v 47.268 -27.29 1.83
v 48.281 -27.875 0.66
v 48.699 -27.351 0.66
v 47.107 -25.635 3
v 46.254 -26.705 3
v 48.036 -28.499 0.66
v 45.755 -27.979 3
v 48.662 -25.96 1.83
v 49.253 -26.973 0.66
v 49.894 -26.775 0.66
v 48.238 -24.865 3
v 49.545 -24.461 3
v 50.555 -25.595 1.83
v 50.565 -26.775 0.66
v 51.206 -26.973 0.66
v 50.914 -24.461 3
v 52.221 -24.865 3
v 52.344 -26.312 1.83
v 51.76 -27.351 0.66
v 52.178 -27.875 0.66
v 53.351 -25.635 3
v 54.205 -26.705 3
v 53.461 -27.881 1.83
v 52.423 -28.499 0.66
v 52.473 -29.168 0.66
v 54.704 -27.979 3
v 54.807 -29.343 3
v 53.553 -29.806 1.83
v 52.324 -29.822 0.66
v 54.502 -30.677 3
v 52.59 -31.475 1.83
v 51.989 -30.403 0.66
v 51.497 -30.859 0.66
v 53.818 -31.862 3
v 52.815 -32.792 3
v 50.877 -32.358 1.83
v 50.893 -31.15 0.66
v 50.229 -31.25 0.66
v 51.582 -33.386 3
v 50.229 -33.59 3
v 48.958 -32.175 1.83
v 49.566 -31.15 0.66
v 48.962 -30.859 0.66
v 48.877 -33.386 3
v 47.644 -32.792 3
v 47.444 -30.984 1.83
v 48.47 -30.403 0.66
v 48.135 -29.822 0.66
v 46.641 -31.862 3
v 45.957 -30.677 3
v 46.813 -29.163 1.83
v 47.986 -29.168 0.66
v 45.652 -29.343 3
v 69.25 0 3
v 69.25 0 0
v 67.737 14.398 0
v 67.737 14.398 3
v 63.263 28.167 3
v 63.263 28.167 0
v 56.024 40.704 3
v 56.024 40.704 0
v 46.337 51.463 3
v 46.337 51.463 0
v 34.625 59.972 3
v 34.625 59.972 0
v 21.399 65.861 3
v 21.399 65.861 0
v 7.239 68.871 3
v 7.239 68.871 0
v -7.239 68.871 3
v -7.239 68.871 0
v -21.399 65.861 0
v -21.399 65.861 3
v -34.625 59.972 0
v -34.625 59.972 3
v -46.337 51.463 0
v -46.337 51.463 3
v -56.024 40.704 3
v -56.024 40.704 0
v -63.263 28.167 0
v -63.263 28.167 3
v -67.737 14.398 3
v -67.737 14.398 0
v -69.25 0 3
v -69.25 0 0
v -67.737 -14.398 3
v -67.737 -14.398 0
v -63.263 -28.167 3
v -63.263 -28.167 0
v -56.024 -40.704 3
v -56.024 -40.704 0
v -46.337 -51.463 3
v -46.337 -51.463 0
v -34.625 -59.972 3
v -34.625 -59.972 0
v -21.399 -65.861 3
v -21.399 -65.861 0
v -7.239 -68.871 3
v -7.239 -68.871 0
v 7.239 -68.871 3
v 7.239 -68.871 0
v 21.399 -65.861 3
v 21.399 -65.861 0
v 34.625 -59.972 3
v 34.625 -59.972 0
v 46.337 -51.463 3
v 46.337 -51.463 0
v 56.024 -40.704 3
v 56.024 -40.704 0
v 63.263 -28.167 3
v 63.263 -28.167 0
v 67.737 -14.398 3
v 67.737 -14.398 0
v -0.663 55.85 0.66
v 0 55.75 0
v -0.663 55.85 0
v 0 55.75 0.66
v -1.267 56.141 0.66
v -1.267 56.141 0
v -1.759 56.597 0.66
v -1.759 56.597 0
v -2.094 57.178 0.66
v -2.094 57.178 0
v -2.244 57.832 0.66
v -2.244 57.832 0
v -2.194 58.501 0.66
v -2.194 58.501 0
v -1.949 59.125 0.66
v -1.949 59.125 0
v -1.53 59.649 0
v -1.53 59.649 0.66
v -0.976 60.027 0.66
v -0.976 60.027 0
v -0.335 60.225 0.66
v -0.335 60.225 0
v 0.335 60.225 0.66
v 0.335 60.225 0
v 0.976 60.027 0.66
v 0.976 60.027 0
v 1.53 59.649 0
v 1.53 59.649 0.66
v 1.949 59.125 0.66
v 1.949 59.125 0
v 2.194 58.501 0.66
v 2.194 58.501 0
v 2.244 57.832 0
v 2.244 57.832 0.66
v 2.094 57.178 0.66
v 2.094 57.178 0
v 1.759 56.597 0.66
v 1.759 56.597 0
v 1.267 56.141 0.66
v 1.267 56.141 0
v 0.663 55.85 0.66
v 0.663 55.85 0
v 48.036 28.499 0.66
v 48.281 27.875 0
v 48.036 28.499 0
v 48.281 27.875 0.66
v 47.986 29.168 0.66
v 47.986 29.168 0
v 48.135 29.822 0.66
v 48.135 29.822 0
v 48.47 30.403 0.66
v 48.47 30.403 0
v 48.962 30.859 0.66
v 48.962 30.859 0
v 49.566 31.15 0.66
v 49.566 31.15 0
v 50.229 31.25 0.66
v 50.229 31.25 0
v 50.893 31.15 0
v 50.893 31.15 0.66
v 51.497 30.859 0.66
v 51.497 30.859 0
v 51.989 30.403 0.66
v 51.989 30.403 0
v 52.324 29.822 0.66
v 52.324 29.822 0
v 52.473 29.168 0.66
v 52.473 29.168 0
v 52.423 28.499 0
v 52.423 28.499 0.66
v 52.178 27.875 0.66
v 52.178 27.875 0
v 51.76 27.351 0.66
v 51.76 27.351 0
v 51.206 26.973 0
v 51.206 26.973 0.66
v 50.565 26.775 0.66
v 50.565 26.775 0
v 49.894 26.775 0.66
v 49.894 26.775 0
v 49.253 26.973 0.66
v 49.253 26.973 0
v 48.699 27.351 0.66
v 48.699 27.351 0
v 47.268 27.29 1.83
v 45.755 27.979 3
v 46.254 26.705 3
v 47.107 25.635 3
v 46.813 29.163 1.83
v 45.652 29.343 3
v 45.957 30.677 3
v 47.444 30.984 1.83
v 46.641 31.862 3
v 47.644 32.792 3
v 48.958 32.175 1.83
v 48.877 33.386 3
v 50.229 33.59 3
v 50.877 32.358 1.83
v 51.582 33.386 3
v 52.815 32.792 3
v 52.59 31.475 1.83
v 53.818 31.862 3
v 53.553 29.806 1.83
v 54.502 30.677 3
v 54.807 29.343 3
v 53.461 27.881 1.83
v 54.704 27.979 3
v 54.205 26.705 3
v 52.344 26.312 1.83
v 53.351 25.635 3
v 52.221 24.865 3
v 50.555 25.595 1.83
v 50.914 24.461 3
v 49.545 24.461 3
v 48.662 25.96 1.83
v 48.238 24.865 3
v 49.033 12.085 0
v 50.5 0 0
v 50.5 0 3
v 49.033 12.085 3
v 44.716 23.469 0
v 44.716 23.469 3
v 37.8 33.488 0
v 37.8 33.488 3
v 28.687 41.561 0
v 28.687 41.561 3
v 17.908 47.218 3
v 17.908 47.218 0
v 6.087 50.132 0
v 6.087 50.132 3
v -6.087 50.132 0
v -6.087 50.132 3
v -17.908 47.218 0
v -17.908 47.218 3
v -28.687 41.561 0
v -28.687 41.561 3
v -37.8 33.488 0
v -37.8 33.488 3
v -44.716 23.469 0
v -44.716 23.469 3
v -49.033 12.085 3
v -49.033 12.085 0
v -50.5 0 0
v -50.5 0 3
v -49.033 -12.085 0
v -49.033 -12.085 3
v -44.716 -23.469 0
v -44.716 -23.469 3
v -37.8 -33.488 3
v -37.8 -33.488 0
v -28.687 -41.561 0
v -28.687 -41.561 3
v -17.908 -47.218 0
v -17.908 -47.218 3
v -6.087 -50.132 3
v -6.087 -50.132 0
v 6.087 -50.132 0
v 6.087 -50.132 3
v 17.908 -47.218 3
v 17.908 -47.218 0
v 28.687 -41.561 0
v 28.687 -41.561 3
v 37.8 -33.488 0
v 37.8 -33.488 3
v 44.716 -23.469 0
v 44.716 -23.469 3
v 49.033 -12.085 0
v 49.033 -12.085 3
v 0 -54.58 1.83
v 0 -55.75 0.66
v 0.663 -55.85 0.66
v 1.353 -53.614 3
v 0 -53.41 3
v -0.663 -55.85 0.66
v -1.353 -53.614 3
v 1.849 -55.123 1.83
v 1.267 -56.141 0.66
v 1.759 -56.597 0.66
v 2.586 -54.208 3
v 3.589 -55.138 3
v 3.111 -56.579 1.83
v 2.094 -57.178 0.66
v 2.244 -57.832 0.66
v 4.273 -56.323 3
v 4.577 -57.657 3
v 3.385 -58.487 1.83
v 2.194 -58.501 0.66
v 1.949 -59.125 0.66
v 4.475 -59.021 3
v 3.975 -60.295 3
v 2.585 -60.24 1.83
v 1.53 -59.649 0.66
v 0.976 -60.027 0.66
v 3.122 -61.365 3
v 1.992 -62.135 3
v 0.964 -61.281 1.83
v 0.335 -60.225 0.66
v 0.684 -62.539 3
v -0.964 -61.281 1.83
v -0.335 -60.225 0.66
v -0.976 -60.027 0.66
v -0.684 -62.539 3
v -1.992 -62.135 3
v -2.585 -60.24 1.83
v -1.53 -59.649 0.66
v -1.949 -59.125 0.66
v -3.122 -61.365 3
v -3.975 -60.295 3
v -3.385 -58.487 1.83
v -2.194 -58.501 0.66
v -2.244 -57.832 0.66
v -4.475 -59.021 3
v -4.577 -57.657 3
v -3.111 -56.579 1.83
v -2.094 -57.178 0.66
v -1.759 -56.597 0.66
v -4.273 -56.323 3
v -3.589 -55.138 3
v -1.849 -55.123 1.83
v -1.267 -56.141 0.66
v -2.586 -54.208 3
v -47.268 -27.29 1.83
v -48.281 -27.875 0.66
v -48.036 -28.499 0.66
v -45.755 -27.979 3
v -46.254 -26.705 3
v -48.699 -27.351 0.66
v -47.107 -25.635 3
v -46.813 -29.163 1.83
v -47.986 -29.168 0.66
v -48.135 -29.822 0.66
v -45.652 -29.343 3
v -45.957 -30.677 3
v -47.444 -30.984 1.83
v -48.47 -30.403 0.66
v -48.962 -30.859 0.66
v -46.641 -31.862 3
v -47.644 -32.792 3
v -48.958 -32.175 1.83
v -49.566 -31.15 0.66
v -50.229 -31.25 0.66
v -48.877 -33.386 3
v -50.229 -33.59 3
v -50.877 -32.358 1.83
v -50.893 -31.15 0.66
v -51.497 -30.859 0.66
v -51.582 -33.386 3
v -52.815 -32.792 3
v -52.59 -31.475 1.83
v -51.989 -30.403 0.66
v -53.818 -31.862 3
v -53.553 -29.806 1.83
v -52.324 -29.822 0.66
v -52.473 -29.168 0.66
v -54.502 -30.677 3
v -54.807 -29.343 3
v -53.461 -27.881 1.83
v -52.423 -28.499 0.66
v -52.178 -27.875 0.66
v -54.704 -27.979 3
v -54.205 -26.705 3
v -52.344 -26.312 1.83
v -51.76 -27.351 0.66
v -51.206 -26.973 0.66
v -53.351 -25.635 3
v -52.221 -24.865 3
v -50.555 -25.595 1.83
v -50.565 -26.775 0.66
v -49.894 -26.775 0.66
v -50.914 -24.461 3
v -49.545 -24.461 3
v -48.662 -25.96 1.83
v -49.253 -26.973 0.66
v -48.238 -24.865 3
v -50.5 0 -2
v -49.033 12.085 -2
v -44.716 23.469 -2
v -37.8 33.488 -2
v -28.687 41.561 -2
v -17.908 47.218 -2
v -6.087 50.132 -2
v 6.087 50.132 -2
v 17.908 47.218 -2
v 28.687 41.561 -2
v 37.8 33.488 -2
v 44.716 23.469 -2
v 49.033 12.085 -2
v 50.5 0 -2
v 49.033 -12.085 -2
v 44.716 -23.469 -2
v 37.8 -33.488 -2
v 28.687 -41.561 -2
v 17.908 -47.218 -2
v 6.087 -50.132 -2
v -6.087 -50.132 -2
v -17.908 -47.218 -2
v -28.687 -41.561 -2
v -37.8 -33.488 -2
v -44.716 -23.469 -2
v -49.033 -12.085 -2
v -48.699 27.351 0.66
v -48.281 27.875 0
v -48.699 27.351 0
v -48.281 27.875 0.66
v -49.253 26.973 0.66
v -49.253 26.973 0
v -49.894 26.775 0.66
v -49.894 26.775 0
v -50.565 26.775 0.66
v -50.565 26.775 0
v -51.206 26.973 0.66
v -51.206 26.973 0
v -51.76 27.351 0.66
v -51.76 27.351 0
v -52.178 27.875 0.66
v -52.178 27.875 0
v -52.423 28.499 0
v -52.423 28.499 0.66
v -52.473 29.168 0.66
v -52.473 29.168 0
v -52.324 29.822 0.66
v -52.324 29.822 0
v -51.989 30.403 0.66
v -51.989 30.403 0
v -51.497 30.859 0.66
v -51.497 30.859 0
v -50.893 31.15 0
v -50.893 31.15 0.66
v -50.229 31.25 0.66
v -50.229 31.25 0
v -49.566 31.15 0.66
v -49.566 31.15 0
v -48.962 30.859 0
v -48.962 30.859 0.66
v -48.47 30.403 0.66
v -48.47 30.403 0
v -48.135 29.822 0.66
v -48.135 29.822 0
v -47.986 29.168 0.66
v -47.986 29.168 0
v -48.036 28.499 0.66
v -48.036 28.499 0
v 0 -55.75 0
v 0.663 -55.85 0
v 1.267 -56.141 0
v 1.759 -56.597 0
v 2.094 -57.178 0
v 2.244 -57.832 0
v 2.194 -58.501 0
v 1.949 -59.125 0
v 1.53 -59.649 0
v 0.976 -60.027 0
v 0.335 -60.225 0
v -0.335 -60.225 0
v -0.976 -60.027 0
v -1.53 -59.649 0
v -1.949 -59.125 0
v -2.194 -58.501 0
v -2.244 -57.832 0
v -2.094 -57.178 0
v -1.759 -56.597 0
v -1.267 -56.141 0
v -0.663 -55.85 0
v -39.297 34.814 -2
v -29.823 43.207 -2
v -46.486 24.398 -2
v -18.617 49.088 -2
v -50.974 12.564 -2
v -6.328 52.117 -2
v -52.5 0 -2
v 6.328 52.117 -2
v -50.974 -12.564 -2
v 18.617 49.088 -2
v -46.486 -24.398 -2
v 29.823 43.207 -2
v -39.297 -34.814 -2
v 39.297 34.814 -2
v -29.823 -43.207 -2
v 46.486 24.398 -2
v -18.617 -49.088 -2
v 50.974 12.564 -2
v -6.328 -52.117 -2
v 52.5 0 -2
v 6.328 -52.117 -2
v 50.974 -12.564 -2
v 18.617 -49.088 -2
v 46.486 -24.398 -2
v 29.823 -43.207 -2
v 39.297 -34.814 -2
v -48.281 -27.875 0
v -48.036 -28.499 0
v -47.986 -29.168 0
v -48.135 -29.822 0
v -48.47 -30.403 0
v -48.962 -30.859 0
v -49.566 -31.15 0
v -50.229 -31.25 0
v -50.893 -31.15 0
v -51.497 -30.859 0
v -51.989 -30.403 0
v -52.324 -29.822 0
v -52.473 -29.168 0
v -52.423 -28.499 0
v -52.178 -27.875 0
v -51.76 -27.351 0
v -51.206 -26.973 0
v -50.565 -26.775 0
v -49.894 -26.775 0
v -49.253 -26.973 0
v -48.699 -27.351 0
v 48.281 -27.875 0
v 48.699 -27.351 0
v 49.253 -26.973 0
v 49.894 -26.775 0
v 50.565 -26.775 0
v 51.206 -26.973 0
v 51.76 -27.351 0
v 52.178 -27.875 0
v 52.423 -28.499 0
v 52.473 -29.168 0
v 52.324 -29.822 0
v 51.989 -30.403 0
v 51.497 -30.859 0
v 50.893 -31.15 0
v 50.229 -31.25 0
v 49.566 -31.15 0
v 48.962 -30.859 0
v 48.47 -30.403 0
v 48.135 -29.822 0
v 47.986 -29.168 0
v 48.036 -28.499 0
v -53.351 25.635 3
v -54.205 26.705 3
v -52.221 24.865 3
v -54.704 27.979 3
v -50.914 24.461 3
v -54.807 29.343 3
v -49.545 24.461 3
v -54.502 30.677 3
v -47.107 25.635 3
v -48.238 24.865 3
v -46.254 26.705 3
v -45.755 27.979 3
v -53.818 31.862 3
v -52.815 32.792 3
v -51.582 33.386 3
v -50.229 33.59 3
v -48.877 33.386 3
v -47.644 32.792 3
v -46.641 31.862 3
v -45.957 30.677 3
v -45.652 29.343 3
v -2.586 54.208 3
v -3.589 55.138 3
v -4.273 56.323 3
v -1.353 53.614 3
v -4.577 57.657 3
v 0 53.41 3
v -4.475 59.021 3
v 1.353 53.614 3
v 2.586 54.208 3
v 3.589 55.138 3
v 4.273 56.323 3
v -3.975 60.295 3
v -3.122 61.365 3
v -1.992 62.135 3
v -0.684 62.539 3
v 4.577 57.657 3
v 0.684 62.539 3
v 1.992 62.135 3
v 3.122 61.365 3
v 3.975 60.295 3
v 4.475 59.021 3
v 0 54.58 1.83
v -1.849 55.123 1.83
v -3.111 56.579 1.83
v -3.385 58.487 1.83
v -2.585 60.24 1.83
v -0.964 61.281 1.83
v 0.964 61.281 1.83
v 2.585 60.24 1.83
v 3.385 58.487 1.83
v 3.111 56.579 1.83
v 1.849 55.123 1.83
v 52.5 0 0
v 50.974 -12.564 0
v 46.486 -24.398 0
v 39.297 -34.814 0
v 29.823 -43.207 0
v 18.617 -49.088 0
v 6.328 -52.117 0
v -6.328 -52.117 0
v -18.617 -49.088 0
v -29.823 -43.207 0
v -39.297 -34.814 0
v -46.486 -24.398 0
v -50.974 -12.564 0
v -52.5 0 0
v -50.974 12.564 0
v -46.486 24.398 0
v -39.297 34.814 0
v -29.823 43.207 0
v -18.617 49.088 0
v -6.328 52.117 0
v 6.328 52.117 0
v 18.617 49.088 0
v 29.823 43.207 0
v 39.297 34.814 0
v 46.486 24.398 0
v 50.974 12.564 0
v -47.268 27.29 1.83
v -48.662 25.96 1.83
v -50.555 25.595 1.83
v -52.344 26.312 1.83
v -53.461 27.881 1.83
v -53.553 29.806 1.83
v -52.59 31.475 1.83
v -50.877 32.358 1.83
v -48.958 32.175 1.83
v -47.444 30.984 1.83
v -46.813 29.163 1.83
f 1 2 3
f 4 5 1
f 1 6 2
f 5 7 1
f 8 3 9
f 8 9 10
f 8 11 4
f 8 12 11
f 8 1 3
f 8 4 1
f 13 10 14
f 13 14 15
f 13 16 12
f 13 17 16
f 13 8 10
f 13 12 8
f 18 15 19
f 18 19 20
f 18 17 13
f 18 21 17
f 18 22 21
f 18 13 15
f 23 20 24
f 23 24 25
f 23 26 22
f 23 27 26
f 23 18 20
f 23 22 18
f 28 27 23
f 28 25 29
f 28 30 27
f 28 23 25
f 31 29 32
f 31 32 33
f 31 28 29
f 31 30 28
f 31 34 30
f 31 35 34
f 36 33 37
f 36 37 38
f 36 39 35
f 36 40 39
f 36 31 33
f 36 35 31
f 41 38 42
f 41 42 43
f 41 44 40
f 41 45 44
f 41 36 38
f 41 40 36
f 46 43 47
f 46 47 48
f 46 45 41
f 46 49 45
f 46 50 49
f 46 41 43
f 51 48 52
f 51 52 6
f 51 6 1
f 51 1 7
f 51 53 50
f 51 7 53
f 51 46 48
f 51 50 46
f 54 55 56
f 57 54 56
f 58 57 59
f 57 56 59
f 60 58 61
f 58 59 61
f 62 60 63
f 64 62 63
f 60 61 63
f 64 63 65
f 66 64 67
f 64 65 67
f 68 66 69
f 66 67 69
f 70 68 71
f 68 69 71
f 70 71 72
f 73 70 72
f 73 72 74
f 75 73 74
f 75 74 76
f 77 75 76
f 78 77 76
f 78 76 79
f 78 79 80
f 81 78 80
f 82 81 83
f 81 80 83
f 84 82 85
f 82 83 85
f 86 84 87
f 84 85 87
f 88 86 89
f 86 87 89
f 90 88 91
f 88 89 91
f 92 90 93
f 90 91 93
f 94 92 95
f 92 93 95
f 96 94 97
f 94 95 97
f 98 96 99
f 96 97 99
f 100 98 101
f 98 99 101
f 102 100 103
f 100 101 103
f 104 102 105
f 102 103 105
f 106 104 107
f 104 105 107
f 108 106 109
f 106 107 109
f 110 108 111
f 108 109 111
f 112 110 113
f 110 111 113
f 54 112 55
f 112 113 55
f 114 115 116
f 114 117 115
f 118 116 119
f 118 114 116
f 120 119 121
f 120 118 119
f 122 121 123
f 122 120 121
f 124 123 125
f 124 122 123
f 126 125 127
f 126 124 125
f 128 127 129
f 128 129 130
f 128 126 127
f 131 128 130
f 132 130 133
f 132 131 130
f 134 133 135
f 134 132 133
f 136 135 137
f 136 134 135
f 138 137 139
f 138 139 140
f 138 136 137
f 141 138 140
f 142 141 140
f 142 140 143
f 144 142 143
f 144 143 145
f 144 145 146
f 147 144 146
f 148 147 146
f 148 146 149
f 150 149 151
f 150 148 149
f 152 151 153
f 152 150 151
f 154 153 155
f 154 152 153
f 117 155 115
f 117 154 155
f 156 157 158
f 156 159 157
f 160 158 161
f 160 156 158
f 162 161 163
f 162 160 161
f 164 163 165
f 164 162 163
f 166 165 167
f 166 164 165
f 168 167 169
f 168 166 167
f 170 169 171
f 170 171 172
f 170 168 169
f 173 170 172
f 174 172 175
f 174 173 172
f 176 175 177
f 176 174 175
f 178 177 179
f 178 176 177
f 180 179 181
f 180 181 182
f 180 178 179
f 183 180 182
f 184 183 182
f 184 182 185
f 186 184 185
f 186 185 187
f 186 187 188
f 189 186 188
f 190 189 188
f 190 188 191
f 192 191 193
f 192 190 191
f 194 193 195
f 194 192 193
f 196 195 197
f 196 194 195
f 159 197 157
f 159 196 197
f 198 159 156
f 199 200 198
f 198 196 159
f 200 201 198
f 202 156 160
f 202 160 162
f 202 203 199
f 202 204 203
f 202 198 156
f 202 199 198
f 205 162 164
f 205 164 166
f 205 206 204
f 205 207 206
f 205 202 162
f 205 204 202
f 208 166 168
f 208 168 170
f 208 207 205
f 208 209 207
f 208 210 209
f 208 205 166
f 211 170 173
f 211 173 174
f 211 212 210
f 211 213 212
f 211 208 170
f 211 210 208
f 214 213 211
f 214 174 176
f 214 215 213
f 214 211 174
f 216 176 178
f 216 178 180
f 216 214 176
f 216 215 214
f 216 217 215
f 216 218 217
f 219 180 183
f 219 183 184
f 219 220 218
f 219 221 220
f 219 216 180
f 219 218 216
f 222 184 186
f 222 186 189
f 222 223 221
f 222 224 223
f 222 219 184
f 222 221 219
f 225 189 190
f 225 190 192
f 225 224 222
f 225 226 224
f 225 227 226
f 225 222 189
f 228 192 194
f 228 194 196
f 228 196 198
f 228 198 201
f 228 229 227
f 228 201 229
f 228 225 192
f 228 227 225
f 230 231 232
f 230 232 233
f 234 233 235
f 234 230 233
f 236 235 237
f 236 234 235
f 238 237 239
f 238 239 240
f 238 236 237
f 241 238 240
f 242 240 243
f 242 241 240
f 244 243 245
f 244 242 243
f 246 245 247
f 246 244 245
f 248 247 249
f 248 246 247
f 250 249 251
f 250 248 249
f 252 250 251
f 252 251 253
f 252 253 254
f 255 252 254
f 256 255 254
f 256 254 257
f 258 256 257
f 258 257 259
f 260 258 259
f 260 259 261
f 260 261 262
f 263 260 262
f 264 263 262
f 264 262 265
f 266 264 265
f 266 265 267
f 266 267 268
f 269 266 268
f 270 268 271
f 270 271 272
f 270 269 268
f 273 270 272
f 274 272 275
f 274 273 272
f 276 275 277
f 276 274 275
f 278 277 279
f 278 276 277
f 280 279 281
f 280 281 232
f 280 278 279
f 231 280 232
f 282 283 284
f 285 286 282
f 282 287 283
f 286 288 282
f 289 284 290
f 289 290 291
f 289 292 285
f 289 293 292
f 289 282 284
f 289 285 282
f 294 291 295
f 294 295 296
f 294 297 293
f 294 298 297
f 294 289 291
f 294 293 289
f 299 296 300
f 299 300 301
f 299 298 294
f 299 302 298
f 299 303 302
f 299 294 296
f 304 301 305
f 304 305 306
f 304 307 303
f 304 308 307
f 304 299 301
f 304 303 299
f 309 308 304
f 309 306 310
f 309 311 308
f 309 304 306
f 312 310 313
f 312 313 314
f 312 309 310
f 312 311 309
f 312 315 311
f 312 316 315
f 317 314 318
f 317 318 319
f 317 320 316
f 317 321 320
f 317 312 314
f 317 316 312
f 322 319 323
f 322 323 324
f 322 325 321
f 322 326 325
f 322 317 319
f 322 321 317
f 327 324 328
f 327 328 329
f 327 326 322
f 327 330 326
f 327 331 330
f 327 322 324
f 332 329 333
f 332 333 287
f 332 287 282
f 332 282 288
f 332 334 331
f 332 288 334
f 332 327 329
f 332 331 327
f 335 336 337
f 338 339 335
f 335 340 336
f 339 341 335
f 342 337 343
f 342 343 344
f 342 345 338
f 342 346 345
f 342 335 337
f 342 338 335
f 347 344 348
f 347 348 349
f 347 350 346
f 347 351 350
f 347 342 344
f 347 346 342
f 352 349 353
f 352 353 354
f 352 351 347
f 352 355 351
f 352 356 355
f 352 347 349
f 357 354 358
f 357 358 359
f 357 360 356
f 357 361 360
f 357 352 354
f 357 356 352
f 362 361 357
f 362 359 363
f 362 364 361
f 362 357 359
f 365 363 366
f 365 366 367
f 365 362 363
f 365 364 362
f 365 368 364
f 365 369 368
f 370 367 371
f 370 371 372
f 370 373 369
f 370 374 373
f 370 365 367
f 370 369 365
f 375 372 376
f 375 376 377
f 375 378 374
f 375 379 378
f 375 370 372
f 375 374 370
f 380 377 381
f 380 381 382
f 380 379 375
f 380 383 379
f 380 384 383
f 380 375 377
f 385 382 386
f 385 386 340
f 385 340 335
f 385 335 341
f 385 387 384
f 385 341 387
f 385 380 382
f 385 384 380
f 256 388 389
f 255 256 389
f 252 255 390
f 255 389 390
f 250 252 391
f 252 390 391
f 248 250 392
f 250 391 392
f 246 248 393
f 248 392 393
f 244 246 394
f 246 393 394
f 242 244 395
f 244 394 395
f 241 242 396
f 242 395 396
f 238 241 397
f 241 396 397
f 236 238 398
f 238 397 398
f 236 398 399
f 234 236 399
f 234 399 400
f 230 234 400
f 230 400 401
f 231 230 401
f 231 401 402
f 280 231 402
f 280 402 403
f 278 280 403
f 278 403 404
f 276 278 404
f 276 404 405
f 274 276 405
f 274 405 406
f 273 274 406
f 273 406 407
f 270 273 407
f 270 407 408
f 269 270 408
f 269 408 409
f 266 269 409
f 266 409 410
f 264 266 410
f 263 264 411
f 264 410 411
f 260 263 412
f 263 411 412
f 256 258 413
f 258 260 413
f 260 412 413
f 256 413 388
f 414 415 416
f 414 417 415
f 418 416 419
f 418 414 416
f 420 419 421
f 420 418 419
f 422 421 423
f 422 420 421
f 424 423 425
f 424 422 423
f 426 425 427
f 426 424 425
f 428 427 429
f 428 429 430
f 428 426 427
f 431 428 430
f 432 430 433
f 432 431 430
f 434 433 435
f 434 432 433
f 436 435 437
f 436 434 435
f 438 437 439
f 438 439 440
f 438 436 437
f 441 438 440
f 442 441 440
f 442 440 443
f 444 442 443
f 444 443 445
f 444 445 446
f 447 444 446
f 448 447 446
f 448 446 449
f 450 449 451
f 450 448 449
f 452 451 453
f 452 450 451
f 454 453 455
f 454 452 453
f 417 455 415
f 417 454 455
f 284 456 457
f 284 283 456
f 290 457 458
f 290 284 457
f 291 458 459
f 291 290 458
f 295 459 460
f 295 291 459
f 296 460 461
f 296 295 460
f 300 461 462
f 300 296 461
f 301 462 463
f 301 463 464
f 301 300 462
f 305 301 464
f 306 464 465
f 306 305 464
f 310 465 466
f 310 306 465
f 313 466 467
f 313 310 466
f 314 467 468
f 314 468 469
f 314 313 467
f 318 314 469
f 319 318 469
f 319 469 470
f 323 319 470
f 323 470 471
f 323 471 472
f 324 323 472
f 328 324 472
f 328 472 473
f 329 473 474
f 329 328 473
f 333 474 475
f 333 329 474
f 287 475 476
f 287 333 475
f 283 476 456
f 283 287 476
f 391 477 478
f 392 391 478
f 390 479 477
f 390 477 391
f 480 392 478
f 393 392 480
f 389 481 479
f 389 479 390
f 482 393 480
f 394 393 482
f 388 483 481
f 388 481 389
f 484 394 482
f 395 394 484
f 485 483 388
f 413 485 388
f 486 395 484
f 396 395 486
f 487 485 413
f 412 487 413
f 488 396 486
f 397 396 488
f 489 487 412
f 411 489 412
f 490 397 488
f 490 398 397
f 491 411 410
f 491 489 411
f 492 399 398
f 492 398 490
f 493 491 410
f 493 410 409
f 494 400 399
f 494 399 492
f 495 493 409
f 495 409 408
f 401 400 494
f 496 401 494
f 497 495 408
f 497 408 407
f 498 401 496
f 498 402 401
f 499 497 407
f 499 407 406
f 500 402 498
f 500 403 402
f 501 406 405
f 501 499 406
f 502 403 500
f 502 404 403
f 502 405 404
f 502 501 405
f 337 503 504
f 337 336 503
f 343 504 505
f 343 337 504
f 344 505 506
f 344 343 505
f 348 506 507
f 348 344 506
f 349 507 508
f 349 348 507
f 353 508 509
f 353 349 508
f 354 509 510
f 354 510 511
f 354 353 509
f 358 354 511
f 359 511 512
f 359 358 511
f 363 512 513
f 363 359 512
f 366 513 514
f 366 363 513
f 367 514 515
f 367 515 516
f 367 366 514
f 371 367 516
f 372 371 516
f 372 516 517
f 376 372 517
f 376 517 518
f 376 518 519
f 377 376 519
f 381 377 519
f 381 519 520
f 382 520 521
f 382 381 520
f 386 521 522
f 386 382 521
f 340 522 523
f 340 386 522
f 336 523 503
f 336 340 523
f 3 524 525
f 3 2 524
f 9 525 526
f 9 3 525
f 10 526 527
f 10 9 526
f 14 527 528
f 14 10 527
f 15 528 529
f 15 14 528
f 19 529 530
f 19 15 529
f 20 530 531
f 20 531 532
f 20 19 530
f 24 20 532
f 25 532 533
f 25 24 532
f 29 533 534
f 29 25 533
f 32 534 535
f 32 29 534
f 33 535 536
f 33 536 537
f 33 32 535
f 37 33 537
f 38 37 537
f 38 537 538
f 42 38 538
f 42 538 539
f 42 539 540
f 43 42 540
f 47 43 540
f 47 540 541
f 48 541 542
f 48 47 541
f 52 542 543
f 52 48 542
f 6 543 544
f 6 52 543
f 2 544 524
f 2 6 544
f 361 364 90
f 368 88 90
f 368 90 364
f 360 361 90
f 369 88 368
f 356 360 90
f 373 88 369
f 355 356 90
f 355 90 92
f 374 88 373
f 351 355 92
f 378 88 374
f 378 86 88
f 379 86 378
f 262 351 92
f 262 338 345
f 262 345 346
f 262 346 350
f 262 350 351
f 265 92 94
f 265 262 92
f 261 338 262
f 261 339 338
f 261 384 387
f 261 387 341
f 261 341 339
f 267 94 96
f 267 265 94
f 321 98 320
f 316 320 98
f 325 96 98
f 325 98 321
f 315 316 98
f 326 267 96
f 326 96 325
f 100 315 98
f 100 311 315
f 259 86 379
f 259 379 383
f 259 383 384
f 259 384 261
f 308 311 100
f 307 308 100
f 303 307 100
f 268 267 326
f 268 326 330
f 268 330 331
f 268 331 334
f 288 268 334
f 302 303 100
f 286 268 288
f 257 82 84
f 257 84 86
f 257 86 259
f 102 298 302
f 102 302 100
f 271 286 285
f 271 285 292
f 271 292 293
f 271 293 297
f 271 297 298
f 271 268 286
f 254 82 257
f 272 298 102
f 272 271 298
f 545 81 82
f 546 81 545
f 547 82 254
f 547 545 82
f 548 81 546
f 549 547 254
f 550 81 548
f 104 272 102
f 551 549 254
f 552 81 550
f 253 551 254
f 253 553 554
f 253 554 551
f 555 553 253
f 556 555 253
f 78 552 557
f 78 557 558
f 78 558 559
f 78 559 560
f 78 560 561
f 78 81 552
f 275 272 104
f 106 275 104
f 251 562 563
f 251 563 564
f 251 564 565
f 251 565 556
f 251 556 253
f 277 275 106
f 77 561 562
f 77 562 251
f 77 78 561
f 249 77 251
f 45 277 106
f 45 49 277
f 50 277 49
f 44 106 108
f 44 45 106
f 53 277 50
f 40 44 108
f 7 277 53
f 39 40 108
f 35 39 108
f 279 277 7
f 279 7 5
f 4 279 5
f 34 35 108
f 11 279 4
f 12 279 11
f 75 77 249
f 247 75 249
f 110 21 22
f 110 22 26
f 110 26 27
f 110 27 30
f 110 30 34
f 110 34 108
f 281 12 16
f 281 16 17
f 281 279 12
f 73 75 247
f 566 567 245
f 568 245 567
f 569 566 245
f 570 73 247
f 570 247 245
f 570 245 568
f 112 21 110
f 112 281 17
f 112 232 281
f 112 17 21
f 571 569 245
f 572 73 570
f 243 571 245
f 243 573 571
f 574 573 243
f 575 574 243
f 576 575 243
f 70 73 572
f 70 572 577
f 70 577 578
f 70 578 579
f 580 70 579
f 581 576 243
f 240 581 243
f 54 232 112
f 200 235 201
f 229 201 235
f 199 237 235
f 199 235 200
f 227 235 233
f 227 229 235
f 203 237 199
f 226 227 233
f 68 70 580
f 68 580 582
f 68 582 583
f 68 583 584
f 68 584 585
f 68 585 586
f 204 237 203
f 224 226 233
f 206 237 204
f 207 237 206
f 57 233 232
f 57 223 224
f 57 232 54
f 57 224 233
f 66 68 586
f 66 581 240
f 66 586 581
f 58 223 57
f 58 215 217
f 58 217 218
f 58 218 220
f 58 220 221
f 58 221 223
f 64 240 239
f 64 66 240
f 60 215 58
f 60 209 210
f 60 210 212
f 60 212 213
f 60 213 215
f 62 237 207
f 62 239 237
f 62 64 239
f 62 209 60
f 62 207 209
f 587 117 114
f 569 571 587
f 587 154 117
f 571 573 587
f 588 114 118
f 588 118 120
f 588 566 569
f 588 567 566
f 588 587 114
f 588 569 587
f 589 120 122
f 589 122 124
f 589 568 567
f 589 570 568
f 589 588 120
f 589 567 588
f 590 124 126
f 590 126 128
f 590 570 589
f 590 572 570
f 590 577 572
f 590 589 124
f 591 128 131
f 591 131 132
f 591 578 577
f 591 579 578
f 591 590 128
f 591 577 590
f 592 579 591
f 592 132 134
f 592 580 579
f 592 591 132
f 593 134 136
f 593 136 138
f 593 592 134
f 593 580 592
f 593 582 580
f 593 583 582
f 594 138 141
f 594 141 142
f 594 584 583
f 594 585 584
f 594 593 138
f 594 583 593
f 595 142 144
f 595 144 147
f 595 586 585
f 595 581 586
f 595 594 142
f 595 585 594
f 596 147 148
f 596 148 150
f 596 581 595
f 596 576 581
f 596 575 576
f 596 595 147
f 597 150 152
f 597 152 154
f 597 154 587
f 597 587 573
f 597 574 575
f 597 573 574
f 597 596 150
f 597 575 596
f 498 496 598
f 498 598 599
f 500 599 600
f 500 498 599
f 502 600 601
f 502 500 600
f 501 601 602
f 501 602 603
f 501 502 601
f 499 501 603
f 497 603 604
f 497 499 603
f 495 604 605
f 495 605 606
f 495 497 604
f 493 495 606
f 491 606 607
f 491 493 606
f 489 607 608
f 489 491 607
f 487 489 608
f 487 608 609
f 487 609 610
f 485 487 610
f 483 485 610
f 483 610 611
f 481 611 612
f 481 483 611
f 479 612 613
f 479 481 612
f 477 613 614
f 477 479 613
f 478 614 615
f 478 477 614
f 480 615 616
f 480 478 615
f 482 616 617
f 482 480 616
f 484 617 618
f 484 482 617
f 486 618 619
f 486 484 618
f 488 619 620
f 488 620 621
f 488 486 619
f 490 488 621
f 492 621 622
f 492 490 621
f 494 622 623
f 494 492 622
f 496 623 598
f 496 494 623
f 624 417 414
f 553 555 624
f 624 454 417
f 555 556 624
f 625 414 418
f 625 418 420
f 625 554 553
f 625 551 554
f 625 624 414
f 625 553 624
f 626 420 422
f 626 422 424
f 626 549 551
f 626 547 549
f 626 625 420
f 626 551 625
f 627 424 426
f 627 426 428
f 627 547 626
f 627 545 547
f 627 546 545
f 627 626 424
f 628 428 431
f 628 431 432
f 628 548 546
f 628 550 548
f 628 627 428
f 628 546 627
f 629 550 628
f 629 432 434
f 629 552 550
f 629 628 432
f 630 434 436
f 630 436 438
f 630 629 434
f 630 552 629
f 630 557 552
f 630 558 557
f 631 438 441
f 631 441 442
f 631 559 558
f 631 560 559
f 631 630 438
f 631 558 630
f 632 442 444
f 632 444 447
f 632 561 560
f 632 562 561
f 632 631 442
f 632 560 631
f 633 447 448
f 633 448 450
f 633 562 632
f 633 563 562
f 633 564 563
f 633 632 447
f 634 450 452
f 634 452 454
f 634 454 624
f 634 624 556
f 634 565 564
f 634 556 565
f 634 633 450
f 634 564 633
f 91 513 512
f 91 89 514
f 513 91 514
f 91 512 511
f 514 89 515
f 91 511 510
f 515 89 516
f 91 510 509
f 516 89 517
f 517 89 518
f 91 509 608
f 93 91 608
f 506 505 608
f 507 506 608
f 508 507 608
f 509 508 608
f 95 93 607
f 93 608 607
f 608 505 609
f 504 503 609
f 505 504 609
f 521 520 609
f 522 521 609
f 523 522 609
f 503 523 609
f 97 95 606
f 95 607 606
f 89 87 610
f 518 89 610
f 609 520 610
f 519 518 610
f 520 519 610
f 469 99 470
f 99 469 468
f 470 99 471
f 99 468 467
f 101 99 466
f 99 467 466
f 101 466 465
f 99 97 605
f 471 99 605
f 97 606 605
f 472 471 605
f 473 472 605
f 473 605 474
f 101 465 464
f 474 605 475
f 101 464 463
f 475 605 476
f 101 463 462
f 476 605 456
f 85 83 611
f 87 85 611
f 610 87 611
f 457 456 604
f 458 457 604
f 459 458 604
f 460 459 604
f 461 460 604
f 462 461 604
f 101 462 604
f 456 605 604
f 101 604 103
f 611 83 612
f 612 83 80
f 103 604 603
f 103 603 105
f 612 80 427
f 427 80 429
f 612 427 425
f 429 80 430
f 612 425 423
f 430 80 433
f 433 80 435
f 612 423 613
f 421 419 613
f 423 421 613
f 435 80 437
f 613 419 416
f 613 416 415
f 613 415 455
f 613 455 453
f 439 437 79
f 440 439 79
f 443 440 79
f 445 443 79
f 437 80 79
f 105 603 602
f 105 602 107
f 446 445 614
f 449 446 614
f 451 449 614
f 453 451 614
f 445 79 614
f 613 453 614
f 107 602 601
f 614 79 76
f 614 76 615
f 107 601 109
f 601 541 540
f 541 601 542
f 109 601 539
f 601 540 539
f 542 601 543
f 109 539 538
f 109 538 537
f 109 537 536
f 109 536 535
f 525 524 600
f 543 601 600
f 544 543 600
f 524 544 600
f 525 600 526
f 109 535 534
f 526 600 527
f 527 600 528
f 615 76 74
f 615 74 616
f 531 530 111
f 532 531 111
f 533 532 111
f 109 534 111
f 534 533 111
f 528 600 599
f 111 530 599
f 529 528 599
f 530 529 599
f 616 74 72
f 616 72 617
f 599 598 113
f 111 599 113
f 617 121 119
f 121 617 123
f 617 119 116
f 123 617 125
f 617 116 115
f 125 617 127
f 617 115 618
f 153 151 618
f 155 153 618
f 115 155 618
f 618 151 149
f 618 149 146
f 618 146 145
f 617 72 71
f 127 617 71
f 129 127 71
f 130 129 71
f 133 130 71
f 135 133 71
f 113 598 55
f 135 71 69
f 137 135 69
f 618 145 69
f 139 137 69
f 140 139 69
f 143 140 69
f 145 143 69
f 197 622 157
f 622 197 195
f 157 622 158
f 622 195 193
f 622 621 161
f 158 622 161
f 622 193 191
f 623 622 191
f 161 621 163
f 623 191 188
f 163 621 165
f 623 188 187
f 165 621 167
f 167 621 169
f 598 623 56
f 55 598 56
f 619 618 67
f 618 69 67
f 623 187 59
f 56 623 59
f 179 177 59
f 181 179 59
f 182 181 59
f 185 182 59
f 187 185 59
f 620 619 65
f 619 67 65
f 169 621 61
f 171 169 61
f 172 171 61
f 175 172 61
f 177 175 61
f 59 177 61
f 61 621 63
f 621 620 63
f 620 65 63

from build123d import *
from build123d.topology import SkipClean

# Parameters (mm, degrees)
SKETCH1_R           = 69.25
SKETCH1_R_2         = 50.5
EXTRUDE1_DEPTH      = 3
SKETCH2_R           = 2
CUT_EXTRUDE1_DEPTH  = 10
CIRPATTERN1_COUNT   = 6
BOSS_EXTRUDE1_START = 2
SKETCH4_R           = 52.5
SKETCH4_R_2         = 50.5
BOSS_EXTRUDE1_DEPTH = 2


with BuildPart() as part:
    # Sketch1 → Extrude1 (new body)
    with BuildSketch(Plane.XY):
        Circle(SKETCH1_R)
        Circle(SKETCH1_R_2, mode=Mode.SUBTRACT)
    extrude(amount=EXTRUDE1_DEPTH)

    # Sketch2 → Cut-Extrude1 (cut)
    with BuildSketch(Plane.XY.offset(3)):
        with Locations((0, 58)):
            Circle(SKETCH2_R)
    extrude(amount=-CUT_EXTRUDE1_DEPTH, mode=Mode.SUBTRACT)

    # Sketch3 → CSK for M4 Hex Socket Countersunk Head Screw1 (revolve, cut)
    with BuildSketch(Plane(origin=(0, 58, 3), x_dir=(0, -1, 0), z_dir=(1, 0, 0))):
        Polygon((0, 0), (0, 3), (2.25, 3), (2.25, 2.34), (4.59, 0), align=None)
    csk_for_m4_hex_socket_countersunk_head_s = revolve(axis=Axis((0, 58, 9.35), (0, 0, -1)), mode=Mode.SUBTRACT)

    # CirPattern1: CSK for M4 Hex Socket Countersunk Head Screw1 ×6 about axis
    cirpattern1_axis = Axis((0, 0, 3), (0, 0, -1))
    for i in range(1, CIRPATTERN1_COUNT):
        add(csk_for_m4_hex_socket_countersunk_head_s.rotate(cirpattern1_axis, i * 360 / CIRPATTERN1_COUNT), mode=Mode.SUBTRACT)

    # Sketch4 → Boss-Extrude1 (add)
    with SkipClean():  # the faces are left unmerged after this step: merging them gives an invalid solid
        with BuildSketch(Plane(origin=(0, 0, 0), x_dir=(-1, 0, 0), z_dir=(0, 0, -1)).offset(BOSS_EXTRUDE1_START)):
            Circle(SKETCH4_R)
            Circle(SKETCH4_R_2, mode=Mode.SUBTRACT)
        extrude(amount=-BOSS_EXTRUDE1_DEPTH)


solid = part.part
